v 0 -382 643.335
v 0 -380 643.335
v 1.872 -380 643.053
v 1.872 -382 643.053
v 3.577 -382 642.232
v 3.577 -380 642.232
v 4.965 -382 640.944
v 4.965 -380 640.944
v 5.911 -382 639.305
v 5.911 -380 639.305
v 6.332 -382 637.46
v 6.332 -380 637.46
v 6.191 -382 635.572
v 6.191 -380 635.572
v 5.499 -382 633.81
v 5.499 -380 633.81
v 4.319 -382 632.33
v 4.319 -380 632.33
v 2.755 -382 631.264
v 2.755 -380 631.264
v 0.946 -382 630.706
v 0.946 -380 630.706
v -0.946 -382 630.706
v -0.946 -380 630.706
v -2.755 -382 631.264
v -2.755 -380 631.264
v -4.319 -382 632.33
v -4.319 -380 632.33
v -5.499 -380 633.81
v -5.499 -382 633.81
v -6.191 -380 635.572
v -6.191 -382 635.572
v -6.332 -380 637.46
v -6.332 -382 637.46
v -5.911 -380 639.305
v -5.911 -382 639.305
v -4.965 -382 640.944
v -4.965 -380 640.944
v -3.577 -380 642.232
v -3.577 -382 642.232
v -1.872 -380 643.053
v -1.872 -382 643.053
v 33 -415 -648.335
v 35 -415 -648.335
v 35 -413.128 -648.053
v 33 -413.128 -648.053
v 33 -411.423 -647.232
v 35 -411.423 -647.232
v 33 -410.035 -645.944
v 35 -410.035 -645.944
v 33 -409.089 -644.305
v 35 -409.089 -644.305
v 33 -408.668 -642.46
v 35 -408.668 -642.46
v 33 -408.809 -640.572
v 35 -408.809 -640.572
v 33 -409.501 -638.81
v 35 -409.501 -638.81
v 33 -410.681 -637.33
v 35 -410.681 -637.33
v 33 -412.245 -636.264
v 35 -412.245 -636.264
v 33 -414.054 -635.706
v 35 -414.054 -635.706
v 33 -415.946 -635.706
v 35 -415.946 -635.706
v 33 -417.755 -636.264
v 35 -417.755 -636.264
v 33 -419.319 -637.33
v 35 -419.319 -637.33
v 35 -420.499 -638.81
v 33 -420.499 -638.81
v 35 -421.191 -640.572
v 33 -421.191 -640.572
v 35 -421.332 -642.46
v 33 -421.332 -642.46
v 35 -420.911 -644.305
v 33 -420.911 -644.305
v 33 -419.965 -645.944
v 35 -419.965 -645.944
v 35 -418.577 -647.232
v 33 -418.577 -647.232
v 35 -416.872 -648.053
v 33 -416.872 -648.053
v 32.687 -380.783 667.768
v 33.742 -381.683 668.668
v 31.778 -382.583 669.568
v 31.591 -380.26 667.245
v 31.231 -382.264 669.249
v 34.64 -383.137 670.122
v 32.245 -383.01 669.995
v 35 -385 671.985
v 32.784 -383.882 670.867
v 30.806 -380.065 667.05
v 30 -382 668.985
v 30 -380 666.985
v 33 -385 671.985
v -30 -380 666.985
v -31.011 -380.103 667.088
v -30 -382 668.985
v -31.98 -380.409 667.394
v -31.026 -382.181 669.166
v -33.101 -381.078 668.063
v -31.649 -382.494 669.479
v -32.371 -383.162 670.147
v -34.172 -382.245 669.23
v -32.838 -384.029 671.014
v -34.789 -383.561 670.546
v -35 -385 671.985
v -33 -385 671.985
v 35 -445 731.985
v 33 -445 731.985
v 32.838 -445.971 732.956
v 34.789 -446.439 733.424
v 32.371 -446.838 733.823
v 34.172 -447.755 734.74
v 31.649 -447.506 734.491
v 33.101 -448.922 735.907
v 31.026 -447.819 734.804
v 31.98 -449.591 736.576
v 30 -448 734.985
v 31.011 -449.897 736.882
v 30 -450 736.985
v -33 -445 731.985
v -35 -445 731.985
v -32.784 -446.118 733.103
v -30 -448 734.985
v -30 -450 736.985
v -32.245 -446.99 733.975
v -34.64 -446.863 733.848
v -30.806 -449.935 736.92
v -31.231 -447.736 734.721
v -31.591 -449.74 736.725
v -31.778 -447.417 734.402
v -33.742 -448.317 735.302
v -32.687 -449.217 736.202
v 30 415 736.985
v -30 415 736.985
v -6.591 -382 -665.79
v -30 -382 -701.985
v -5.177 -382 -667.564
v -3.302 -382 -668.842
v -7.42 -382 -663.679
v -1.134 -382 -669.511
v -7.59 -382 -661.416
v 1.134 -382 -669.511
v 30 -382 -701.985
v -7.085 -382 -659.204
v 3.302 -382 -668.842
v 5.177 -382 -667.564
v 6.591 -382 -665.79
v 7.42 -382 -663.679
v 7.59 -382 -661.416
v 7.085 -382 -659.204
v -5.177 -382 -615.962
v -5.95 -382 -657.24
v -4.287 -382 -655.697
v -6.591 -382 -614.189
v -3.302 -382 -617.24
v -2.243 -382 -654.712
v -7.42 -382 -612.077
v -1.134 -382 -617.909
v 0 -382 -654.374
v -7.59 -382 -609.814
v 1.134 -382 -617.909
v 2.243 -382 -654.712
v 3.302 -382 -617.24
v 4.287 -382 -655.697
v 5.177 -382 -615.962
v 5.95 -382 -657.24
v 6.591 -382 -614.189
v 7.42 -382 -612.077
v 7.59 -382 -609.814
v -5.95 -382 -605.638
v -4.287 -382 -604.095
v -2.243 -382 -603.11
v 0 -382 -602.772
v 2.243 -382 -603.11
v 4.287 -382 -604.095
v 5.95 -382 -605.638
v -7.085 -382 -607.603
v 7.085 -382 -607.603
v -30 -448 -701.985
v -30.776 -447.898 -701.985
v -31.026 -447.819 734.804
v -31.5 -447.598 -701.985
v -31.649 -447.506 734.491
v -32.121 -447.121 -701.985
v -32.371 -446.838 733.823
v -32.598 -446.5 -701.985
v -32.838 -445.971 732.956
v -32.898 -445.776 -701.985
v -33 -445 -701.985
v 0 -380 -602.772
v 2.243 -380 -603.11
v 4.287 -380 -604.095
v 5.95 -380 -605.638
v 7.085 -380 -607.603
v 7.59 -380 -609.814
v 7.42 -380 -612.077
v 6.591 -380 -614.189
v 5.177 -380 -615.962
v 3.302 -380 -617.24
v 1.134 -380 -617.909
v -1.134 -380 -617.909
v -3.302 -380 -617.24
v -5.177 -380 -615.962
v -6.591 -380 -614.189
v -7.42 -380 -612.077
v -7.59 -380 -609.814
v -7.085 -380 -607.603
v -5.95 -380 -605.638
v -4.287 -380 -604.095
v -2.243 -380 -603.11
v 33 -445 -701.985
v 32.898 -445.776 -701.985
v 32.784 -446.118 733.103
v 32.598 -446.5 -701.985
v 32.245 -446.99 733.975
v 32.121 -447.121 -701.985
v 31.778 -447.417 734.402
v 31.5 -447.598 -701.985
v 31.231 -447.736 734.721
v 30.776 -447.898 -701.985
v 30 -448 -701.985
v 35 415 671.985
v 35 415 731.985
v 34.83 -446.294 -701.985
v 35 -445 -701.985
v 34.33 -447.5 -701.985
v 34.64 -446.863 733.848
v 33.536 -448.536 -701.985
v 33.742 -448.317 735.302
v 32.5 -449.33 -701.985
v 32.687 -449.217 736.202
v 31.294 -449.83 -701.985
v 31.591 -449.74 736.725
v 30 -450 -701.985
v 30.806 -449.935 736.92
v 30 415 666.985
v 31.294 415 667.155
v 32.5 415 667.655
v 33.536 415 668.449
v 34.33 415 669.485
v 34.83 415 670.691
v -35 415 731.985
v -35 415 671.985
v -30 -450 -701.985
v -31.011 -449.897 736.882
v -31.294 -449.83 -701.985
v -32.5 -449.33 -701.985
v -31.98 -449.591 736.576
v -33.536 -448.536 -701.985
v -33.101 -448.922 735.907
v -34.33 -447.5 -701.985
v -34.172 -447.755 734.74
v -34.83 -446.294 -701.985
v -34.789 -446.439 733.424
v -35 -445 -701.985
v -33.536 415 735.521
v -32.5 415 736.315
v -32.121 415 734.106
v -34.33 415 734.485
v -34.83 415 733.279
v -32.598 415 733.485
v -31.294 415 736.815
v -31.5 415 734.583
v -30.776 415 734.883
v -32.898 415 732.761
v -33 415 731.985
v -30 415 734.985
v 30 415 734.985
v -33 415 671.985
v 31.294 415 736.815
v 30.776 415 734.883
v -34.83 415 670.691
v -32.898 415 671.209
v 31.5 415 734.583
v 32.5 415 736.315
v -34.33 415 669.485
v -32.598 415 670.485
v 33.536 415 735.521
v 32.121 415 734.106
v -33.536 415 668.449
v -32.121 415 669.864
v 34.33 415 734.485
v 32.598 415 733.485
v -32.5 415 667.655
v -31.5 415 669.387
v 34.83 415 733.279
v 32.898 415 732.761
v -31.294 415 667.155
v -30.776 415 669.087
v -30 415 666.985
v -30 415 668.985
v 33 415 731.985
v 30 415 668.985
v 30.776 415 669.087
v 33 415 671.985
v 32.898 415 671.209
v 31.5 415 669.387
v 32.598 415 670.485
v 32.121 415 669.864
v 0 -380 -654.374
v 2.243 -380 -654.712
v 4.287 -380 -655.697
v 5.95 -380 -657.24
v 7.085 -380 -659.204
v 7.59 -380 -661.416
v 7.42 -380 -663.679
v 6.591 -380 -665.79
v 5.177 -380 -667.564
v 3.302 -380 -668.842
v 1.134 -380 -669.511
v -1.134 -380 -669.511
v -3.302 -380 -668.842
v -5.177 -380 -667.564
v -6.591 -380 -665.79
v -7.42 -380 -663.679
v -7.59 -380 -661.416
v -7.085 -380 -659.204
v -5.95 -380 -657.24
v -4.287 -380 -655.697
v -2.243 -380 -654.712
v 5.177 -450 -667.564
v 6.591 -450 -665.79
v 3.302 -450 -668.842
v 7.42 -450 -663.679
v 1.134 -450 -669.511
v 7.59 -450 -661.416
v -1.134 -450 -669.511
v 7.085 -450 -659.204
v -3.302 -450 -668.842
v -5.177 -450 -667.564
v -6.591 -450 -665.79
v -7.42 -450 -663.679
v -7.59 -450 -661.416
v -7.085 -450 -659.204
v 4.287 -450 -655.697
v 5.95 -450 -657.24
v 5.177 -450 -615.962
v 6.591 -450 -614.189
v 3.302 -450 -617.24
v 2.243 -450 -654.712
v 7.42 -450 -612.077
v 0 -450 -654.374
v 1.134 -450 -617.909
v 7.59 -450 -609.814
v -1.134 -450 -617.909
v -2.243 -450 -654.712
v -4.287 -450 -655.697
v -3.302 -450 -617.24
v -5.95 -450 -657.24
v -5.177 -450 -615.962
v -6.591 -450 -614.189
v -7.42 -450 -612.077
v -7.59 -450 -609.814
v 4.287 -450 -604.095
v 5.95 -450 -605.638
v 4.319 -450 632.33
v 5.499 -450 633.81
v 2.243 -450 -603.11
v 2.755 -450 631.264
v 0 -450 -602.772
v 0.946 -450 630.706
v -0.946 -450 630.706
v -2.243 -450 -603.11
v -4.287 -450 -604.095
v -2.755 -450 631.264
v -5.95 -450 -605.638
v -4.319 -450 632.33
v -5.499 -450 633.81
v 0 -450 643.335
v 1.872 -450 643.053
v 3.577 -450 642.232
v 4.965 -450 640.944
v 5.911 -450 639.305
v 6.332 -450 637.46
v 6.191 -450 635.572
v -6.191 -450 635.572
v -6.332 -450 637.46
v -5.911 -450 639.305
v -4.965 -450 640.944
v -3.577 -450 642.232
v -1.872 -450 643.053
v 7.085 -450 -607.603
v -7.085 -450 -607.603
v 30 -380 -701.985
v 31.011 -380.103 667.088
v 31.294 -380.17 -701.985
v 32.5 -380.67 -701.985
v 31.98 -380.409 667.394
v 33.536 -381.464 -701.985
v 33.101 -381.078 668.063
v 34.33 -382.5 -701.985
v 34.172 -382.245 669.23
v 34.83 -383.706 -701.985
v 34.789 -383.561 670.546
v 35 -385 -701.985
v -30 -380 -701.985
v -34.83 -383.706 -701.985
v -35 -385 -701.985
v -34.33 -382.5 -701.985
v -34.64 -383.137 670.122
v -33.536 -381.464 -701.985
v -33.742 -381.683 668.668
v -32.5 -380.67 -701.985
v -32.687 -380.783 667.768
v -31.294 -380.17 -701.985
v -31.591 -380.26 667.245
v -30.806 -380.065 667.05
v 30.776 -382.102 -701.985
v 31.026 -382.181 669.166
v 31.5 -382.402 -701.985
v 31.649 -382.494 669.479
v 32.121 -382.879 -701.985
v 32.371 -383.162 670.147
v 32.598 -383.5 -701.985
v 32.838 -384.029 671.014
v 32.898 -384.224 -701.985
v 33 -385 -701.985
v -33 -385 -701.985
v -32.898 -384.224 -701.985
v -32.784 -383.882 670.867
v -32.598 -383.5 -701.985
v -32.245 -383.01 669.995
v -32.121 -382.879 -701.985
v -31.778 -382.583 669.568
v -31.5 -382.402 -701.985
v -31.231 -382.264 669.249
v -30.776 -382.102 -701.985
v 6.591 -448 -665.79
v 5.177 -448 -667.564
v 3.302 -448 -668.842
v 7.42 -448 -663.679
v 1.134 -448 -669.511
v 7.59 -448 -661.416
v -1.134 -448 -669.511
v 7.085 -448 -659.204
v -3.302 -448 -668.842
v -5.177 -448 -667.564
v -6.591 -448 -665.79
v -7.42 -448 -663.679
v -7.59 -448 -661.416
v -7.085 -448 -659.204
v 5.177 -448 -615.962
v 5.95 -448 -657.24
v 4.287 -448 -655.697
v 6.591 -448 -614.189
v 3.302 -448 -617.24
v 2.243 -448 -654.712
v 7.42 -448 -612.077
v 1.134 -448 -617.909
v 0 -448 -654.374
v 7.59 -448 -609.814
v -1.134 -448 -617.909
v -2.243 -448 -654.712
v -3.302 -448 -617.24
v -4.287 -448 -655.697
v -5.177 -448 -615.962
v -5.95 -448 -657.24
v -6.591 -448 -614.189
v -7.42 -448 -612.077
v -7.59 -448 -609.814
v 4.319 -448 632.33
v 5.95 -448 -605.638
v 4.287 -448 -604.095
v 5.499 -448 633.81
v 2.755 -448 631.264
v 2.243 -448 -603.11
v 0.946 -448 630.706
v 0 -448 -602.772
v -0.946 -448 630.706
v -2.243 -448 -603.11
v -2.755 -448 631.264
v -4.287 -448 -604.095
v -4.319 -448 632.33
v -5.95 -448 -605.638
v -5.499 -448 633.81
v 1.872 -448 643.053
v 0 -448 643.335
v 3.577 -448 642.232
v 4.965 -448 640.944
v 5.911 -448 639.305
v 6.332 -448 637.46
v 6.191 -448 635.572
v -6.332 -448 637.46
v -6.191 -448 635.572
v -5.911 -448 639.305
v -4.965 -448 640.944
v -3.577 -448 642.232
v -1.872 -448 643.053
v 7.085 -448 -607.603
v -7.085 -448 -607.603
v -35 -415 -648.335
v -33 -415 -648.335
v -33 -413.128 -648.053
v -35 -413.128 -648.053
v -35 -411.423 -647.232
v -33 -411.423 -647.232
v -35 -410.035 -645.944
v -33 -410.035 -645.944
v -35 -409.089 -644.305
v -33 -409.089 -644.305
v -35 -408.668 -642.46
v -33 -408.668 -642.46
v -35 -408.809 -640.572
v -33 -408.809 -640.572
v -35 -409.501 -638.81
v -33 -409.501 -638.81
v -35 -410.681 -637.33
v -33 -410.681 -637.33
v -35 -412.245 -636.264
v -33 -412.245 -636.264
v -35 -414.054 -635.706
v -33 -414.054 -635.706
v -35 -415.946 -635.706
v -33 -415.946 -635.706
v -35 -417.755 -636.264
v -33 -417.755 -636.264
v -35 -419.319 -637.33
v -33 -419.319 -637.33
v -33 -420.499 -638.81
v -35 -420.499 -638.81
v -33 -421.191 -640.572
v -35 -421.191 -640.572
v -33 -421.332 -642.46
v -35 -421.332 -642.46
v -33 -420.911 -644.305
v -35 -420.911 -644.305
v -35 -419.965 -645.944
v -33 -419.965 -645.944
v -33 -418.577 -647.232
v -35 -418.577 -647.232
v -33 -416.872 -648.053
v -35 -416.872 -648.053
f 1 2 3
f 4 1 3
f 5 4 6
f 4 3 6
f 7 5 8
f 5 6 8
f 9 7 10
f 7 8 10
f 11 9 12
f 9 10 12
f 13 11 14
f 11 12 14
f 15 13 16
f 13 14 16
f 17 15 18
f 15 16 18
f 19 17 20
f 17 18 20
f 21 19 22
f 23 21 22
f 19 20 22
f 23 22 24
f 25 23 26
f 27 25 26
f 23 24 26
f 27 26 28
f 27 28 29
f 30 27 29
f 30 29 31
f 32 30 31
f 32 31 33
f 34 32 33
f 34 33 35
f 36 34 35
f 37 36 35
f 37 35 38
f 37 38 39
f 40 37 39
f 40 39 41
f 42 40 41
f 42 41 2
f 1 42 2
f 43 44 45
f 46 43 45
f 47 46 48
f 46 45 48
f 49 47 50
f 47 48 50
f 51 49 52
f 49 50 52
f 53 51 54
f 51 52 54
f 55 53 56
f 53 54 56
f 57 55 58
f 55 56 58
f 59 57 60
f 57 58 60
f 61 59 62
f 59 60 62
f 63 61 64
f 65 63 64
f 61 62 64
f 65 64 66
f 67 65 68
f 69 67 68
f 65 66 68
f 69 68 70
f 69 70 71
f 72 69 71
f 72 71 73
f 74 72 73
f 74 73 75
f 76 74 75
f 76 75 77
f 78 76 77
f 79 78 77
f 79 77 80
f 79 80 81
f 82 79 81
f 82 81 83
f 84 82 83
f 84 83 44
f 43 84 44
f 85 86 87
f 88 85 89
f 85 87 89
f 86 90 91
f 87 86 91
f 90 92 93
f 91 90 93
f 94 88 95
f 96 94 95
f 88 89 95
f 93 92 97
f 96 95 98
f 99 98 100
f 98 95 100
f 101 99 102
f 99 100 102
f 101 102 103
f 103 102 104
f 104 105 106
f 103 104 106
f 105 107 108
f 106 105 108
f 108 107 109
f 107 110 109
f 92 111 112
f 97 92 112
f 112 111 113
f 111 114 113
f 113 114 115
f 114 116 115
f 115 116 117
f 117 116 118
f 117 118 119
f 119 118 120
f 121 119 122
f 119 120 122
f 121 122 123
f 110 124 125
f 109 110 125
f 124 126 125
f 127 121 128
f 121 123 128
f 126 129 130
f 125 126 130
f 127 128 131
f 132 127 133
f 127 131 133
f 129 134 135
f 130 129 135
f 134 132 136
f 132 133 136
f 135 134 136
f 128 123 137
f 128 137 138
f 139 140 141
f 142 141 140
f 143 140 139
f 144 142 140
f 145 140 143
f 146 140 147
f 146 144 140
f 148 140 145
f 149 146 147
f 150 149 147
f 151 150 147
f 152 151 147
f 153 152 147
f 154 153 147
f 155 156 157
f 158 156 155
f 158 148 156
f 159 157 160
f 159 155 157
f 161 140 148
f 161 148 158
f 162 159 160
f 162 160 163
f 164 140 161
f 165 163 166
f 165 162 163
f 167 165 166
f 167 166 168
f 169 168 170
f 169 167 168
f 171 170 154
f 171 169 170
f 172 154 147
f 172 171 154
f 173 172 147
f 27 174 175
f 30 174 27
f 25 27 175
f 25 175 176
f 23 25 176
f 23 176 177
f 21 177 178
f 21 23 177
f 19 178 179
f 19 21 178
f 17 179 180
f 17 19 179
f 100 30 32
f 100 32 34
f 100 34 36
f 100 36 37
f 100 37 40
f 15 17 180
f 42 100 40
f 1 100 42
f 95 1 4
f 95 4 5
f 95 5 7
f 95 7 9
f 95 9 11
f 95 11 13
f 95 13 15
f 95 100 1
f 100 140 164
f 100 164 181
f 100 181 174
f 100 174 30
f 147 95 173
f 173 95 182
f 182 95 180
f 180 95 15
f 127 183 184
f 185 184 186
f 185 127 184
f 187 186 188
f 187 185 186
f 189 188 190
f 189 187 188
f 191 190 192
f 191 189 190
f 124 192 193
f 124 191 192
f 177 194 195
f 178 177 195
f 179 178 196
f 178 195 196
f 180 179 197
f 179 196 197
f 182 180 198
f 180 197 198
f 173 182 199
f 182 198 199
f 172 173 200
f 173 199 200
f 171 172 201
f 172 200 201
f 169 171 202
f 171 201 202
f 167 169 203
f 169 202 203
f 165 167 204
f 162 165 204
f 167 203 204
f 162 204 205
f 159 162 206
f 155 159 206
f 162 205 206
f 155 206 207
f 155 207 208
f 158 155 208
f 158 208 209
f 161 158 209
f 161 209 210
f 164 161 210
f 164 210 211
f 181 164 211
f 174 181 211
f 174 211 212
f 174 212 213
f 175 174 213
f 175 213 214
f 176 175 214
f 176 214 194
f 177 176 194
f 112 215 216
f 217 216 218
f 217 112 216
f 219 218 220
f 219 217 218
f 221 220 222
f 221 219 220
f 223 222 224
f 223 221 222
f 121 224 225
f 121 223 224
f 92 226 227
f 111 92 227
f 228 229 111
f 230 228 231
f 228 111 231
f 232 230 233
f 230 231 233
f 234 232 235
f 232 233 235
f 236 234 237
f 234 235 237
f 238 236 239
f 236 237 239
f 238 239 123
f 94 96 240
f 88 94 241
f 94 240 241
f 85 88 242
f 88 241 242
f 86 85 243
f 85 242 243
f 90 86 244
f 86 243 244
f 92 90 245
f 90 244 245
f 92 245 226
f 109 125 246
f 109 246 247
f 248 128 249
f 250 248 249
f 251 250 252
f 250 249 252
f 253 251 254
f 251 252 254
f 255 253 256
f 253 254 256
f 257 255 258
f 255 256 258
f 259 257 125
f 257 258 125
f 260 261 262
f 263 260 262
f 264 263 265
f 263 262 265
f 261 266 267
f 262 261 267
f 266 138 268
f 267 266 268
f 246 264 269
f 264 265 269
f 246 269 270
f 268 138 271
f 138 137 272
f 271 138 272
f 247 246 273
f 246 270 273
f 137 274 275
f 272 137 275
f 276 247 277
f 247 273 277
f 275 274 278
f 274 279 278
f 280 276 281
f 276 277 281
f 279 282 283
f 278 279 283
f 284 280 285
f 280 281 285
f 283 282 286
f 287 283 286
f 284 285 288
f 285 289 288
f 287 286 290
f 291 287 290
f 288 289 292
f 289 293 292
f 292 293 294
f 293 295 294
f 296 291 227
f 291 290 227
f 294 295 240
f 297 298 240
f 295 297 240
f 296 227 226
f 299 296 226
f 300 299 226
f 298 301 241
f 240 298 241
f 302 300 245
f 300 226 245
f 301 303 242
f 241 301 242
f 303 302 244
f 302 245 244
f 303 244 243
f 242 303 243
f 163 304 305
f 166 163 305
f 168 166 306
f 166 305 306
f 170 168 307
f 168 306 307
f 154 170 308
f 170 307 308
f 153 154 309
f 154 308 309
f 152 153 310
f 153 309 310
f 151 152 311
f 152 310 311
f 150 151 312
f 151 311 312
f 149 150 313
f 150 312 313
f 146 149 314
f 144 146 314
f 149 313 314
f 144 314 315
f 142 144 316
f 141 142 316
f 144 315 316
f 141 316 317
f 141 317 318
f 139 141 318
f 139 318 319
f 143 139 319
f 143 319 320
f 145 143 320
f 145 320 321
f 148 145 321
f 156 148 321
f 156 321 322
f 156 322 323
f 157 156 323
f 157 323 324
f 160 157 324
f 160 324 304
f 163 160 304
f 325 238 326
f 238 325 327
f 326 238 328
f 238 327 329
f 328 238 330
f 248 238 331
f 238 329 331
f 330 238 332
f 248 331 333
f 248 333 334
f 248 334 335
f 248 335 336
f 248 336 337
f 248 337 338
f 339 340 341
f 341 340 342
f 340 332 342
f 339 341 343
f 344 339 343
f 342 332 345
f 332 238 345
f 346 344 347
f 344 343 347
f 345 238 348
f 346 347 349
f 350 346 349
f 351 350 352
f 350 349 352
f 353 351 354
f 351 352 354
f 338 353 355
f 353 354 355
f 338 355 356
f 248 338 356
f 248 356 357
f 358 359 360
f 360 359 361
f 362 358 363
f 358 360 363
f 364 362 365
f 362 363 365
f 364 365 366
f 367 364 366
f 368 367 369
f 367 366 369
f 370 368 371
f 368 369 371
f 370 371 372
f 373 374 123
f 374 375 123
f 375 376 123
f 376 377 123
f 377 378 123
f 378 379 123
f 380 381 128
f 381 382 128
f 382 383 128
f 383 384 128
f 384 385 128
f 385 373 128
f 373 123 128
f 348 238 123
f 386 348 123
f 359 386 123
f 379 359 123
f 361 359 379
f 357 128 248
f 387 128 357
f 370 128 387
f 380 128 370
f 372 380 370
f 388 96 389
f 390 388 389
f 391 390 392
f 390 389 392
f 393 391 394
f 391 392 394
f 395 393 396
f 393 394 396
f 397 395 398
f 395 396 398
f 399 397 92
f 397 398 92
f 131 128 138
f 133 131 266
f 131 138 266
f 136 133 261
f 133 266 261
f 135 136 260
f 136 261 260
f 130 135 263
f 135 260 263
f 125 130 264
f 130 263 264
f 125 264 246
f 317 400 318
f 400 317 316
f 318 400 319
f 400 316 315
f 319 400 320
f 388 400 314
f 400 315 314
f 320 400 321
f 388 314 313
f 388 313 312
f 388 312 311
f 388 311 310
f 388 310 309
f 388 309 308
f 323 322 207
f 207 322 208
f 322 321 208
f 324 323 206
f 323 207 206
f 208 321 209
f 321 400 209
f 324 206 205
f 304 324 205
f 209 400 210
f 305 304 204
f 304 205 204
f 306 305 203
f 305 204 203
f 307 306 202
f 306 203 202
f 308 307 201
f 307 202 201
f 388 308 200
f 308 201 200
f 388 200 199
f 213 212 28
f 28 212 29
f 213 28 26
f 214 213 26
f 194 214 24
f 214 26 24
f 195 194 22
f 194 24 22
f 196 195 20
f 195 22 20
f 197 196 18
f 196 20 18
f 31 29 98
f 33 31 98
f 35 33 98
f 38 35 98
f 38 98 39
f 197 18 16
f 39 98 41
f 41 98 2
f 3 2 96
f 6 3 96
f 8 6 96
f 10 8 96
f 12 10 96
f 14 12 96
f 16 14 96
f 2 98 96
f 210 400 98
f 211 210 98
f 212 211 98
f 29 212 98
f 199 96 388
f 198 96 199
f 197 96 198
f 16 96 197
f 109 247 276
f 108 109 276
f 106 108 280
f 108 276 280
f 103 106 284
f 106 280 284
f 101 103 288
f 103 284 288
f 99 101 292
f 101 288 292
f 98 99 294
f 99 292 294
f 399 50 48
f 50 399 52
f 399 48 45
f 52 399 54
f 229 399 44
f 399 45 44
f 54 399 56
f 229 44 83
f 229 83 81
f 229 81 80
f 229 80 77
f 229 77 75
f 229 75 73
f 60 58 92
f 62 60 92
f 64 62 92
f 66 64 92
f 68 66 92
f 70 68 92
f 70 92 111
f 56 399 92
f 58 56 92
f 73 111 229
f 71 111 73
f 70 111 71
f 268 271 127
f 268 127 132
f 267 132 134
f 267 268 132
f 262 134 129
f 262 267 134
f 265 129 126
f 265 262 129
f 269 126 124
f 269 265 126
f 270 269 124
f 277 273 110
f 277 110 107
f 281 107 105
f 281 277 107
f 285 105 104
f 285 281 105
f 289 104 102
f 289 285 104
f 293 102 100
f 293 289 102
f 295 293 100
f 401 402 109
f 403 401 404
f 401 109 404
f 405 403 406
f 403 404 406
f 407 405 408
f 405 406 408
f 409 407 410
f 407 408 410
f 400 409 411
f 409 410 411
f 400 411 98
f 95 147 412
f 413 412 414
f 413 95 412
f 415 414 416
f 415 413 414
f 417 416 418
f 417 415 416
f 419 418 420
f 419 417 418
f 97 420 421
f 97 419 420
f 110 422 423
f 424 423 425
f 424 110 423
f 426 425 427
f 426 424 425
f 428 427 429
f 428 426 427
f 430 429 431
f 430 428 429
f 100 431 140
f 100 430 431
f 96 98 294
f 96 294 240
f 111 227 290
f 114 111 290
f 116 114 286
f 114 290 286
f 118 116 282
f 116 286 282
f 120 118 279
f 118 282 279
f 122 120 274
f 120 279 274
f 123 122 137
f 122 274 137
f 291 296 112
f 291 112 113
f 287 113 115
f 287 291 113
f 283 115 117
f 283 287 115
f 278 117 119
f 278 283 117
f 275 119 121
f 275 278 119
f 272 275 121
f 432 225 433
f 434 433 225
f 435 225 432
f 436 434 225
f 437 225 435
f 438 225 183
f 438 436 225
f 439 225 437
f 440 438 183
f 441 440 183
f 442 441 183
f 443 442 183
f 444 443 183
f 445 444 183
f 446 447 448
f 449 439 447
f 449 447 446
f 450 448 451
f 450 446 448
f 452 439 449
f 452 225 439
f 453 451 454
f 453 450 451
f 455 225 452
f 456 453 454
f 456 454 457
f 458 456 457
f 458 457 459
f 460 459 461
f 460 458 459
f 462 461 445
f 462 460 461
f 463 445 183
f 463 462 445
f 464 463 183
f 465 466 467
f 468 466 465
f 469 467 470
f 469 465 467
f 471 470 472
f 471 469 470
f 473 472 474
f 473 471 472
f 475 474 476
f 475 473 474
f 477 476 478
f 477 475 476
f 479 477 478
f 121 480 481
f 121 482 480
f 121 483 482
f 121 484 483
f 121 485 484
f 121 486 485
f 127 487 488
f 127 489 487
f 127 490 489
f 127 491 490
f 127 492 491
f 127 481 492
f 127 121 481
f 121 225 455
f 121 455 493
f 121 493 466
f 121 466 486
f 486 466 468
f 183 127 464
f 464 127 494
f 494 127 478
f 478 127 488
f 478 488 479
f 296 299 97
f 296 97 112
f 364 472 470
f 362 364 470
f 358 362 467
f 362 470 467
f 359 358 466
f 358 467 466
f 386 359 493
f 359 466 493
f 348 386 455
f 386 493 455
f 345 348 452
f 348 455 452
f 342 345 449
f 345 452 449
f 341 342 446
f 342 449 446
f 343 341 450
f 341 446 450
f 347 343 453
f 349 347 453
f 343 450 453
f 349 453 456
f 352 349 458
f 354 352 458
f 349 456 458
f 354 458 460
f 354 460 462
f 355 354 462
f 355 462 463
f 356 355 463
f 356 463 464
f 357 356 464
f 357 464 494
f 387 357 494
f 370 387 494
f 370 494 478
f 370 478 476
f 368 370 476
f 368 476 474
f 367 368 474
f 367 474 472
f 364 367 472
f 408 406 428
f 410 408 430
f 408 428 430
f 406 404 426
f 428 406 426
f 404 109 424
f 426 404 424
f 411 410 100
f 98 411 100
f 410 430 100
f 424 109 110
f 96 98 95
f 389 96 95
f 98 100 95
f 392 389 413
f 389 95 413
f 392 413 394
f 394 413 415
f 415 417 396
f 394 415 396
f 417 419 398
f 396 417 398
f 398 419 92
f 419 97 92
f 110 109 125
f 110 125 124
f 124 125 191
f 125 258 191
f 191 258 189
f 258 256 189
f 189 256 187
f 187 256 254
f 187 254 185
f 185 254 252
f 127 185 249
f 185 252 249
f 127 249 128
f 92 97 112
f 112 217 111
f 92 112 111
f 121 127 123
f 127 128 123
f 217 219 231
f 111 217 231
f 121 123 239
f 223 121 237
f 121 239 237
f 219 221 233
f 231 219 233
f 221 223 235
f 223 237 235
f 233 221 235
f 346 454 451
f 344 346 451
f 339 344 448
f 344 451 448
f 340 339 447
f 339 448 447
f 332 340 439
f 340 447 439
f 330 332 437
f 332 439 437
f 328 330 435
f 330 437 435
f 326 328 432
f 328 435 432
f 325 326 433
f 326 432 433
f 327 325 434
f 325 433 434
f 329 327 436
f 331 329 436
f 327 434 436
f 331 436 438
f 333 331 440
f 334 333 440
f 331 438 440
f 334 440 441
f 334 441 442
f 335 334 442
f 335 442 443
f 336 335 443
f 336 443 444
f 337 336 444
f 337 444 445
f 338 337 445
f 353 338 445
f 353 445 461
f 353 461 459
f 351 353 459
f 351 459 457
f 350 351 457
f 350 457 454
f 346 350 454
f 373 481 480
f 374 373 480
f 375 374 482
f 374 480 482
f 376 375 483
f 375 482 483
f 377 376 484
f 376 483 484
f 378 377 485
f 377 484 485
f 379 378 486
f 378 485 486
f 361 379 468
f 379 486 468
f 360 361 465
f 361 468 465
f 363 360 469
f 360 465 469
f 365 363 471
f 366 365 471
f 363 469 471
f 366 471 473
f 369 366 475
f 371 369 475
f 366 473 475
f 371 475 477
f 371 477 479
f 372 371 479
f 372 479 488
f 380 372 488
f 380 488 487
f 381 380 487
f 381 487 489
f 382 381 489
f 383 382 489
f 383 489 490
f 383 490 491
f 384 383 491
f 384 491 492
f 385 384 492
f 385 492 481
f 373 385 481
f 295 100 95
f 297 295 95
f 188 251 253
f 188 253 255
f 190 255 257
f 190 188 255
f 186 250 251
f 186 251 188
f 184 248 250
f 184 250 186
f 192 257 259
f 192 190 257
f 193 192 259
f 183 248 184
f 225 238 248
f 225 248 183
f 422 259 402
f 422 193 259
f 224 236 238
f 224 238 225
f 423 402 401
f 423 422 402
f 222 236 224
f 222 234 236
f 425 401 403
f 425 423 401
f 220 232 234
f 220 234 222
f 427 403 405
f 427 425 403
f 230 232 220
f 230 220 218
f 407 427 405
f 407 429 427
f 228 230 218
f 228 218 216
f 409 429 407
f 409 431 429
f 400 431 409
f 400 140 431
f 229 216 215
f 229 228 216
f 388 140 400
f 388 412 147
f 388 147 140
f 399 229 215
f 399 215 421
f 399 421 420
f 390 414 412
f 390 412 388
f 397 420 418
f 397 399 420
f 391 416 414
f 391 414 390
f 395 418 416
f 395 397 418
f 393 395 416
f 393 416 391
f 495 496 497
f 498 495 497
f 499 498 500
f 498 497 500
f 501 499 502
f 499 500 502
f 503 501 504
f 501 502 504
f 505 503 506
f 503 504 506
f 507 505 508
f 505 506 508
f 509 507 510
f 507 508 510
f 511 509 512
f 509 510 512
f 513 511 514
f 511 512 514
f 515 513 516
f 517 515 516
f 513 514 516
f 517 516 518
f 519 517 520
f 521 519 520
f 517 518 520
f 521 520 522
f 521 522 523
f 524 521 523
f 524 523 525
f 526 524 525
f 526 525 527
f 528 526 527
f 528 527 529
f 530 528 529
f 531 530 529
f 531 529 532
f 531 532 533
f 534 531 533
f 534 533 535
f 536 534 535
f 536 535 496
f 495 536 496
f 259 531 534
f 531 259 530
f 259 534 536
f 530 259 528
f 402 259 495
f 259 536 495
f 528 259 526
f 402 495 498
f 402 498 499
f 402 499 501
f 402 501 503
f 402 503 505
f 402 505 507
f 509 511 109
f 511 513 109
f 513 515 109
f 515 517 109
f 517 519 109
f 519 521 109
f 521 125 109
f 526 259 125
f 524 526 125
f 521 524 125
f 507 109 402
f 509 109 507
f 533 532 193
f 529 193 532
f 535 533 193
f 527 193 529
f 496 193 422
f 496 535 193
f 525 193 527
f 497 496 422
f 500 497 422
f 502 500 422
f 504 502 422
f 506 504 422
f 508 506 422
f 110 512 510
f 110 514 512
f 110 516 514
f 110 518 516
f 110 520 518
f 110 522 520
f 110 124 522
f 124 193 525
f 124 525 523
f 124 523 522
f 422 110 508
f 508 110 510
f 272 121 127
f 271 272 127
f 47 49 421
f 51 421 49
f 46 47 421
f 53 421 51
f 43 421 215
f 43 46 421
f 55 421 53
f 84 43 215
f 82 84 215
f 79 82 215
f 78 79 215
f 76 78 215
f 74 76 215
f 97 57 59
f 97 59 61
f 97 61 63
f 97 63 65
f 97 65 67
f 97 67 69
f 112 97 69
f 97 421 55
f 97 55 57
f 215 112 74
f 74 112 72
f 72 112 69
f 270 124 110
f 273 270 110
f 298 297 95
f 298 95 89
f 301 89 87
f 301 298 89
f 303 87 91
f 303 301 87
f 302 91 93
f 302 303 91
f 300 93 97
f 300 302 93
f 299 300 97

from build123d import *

# Parameters (mm, degrees)
TUBO_CUADRADO_3_X_3_X_0_25_1_DEPTH        = 880.497474683
TUBO_CUADRADO_3_X_3_X_0_25_1_2_DEPTH      = 1403.97
TUBO_CUADRADO_3_X_3_X_0_25_1_2_DEPTH_BACK = 50.497474683
CROQUIS3_R                                = 7.610855116
CROQUIS3_R_2                              = 6.35
CORTAR_EXTRUIR1_DEPTH                     = 1085.618315457
CROQUIS4_R                                = 6.35
CORTAR_EXTRUIR2_DEPTH                     = 867.341093464


with BuildPart() as part:
    # Sketch1 on segment 1 (carried to segment 1) → Tubo cuadrado 3 X 3 X 0.25(1) (new body)
    with BuildSketch(Plane(origin=(0, 415, 701.985), x_dir=(0, 0, -1), z_dir=(0, -1, 0))):
        with BuildLine():
            Line((-30, -35), (30, -35))
            ThreePointArc((30, -35), (33.535533906, -33.535533906), (35, -30))
            Line((35, -30), (35, 30))
            ThreePointArc((35, 30), (33.535533906, 33.535533906), (30, 35))
            Line((30, 35), (-30, 35))
            ThreePointArc((-30, 35), (-33.535533906, 33.535533906), (-35, 30))
            Line((-35, 30), (-35, -30))
            ThreePointArc((-35, -30), (-33.535533906, -33.535533906), (-30, -35))
        make_face()
        with BuildLine():
            Line((-30, -33), (30, -33))
            ThreePointArc((30, -33), (32.121320344, -32.121320344), (33, -30))
            Line((33, -30), (33, 30))
            ThreePointArc((33, 30), (32.121320344, 32.121320344), (30, 33))
            Line((30, 33), (-30, 33))
            ThreePointArc((-30, 33), (-32.121320344, 32.121320344), (-33, 30))
            Line((-33, 30), (-33, -30))
            ThreePointArc((-33, -30), (-32.121320344, -32.121320344), (-30, -33))
        make_face(mode=Mode.SUBTRACT)
    extrude(amount=TUBO_CUADRADO_3_X_3_X_0_25_1_DEPTH)

    # Tubo cuadrado 3 X 3 X 0.25(1) mitre 1
    split(bisect_by=Plane(origin=(0, -415, 701.985), x_dir=(-1, 0, 0), z_dir=(0, 0.707106781, 0.707106781)), keep=Keep.TOP)


with BuildPart() as body_2:
    # Sketch1 → Tubo cuadrado 3 X 3 X 0.25_1 2 (new, two sides: drawn at the far end of the back side and taken through both)
    with BuildSketch(Plane(origin=(0, -415, 701.985), x_dir=(0, 1, 0), z_dir=(0, 0, -1)).offset(-TUBO_CUADRADO_3_X_3_X_0_25_1_2_DEPTH_BACK)):
        with BuildLine():
            Line((-30, -35), (30, -35))
            ThreePointArc((30, -35), (33.535533906, -33.535533906), (35, -30))
            Line((35, -30), (35, 30))
            ThreePointArc((35, 30), (33.535533906, 33.535533906), (30, 35))
            Line((30, 35), (-30, 35))
            ThreePointArc((-30, 35), (-33.535533906, 33.535533906), (-35, 30))
            Line((-35, 30), (-35, -30))
            ThreePointArc((-35, -30), (-33.535533906, -33.535533906), (-30, -35))
        make_face()
        with BuildLine():
            Line((-30, -33), (30, -33))
            ThreePointArc((30, -33), (32.121320344, -32.121320344), (33, -30))
            Line((33, -30), (33, 30))
            ThreePointArc((33, 30), (32.121320344, 32.121320344), (30, 33))
            Line((30, 33), (-30, 33))
            ThreePointArc((-30, 33), (-32.121320344, 32.121320344), (-33, 30))
            Line((-33, 30), (-33, -30))
            ThreePointArc((-33, -30), (-32.121320344, -32.121320344), (-30, -33))
        make_face(mode=Mode.SUBTRACT)
    extrude(amount=TUBO_CUADRADO_3_X_3_X_0_25_1_2_DEPTH + TUBO_CUADRADO_3_X_3_X_0_25_1_2_DEPTH_BACK)

    # Tubo cuadrado 3 X 3 X 0.25_1 2 mitre 1
    split(bisect_by=Plane(origin=(0, -415, 701.985), x_dir=(1, 0, 0), z_dir=(0, -0.707106781, -0.707106781)), keep=Keep.TOP)

    # Croquis3 → Cortar-Extruir1 (cut, through all)
    with BuildSketch(Plane(origin=(0, -380, 0), x_dir=(1, 0, 0), z_dir=(0, 1, 0))):
        with Locations(Location((0, 661.985, 0), (0, 0, 270))):
            Circle(CROQUIS3_R)
        with Locations(Location((0, 610.383182555, 0), (0, 0, 270))):
            Circle(CROQUIS3_R)
        with Locations(Location((0, -636.985, 0), (0, 0, 270))):
            Circle(CROQUIS3_R_2)
    extrude(amount=-CORTAR_EXTRUIR1_DEPTH, mode=Mode.SUBTRACT)

    # Croquis4 → Cortar-Extruir2 (cut, through all)
    with BuildSketch(Plane(origin=(35, 0, 0), x_dir=(0, 0, -1), z_dir=(1, 0, 0))):
        with Locations((641.985, -415)):
            Circle(CROQUIS4_R)
    extrude(amount=-CORTAR_EXTRUIR2_DEPTH, mode=Mode.SUBTRACT)


solid = Compound([part.part, body_2.part])
